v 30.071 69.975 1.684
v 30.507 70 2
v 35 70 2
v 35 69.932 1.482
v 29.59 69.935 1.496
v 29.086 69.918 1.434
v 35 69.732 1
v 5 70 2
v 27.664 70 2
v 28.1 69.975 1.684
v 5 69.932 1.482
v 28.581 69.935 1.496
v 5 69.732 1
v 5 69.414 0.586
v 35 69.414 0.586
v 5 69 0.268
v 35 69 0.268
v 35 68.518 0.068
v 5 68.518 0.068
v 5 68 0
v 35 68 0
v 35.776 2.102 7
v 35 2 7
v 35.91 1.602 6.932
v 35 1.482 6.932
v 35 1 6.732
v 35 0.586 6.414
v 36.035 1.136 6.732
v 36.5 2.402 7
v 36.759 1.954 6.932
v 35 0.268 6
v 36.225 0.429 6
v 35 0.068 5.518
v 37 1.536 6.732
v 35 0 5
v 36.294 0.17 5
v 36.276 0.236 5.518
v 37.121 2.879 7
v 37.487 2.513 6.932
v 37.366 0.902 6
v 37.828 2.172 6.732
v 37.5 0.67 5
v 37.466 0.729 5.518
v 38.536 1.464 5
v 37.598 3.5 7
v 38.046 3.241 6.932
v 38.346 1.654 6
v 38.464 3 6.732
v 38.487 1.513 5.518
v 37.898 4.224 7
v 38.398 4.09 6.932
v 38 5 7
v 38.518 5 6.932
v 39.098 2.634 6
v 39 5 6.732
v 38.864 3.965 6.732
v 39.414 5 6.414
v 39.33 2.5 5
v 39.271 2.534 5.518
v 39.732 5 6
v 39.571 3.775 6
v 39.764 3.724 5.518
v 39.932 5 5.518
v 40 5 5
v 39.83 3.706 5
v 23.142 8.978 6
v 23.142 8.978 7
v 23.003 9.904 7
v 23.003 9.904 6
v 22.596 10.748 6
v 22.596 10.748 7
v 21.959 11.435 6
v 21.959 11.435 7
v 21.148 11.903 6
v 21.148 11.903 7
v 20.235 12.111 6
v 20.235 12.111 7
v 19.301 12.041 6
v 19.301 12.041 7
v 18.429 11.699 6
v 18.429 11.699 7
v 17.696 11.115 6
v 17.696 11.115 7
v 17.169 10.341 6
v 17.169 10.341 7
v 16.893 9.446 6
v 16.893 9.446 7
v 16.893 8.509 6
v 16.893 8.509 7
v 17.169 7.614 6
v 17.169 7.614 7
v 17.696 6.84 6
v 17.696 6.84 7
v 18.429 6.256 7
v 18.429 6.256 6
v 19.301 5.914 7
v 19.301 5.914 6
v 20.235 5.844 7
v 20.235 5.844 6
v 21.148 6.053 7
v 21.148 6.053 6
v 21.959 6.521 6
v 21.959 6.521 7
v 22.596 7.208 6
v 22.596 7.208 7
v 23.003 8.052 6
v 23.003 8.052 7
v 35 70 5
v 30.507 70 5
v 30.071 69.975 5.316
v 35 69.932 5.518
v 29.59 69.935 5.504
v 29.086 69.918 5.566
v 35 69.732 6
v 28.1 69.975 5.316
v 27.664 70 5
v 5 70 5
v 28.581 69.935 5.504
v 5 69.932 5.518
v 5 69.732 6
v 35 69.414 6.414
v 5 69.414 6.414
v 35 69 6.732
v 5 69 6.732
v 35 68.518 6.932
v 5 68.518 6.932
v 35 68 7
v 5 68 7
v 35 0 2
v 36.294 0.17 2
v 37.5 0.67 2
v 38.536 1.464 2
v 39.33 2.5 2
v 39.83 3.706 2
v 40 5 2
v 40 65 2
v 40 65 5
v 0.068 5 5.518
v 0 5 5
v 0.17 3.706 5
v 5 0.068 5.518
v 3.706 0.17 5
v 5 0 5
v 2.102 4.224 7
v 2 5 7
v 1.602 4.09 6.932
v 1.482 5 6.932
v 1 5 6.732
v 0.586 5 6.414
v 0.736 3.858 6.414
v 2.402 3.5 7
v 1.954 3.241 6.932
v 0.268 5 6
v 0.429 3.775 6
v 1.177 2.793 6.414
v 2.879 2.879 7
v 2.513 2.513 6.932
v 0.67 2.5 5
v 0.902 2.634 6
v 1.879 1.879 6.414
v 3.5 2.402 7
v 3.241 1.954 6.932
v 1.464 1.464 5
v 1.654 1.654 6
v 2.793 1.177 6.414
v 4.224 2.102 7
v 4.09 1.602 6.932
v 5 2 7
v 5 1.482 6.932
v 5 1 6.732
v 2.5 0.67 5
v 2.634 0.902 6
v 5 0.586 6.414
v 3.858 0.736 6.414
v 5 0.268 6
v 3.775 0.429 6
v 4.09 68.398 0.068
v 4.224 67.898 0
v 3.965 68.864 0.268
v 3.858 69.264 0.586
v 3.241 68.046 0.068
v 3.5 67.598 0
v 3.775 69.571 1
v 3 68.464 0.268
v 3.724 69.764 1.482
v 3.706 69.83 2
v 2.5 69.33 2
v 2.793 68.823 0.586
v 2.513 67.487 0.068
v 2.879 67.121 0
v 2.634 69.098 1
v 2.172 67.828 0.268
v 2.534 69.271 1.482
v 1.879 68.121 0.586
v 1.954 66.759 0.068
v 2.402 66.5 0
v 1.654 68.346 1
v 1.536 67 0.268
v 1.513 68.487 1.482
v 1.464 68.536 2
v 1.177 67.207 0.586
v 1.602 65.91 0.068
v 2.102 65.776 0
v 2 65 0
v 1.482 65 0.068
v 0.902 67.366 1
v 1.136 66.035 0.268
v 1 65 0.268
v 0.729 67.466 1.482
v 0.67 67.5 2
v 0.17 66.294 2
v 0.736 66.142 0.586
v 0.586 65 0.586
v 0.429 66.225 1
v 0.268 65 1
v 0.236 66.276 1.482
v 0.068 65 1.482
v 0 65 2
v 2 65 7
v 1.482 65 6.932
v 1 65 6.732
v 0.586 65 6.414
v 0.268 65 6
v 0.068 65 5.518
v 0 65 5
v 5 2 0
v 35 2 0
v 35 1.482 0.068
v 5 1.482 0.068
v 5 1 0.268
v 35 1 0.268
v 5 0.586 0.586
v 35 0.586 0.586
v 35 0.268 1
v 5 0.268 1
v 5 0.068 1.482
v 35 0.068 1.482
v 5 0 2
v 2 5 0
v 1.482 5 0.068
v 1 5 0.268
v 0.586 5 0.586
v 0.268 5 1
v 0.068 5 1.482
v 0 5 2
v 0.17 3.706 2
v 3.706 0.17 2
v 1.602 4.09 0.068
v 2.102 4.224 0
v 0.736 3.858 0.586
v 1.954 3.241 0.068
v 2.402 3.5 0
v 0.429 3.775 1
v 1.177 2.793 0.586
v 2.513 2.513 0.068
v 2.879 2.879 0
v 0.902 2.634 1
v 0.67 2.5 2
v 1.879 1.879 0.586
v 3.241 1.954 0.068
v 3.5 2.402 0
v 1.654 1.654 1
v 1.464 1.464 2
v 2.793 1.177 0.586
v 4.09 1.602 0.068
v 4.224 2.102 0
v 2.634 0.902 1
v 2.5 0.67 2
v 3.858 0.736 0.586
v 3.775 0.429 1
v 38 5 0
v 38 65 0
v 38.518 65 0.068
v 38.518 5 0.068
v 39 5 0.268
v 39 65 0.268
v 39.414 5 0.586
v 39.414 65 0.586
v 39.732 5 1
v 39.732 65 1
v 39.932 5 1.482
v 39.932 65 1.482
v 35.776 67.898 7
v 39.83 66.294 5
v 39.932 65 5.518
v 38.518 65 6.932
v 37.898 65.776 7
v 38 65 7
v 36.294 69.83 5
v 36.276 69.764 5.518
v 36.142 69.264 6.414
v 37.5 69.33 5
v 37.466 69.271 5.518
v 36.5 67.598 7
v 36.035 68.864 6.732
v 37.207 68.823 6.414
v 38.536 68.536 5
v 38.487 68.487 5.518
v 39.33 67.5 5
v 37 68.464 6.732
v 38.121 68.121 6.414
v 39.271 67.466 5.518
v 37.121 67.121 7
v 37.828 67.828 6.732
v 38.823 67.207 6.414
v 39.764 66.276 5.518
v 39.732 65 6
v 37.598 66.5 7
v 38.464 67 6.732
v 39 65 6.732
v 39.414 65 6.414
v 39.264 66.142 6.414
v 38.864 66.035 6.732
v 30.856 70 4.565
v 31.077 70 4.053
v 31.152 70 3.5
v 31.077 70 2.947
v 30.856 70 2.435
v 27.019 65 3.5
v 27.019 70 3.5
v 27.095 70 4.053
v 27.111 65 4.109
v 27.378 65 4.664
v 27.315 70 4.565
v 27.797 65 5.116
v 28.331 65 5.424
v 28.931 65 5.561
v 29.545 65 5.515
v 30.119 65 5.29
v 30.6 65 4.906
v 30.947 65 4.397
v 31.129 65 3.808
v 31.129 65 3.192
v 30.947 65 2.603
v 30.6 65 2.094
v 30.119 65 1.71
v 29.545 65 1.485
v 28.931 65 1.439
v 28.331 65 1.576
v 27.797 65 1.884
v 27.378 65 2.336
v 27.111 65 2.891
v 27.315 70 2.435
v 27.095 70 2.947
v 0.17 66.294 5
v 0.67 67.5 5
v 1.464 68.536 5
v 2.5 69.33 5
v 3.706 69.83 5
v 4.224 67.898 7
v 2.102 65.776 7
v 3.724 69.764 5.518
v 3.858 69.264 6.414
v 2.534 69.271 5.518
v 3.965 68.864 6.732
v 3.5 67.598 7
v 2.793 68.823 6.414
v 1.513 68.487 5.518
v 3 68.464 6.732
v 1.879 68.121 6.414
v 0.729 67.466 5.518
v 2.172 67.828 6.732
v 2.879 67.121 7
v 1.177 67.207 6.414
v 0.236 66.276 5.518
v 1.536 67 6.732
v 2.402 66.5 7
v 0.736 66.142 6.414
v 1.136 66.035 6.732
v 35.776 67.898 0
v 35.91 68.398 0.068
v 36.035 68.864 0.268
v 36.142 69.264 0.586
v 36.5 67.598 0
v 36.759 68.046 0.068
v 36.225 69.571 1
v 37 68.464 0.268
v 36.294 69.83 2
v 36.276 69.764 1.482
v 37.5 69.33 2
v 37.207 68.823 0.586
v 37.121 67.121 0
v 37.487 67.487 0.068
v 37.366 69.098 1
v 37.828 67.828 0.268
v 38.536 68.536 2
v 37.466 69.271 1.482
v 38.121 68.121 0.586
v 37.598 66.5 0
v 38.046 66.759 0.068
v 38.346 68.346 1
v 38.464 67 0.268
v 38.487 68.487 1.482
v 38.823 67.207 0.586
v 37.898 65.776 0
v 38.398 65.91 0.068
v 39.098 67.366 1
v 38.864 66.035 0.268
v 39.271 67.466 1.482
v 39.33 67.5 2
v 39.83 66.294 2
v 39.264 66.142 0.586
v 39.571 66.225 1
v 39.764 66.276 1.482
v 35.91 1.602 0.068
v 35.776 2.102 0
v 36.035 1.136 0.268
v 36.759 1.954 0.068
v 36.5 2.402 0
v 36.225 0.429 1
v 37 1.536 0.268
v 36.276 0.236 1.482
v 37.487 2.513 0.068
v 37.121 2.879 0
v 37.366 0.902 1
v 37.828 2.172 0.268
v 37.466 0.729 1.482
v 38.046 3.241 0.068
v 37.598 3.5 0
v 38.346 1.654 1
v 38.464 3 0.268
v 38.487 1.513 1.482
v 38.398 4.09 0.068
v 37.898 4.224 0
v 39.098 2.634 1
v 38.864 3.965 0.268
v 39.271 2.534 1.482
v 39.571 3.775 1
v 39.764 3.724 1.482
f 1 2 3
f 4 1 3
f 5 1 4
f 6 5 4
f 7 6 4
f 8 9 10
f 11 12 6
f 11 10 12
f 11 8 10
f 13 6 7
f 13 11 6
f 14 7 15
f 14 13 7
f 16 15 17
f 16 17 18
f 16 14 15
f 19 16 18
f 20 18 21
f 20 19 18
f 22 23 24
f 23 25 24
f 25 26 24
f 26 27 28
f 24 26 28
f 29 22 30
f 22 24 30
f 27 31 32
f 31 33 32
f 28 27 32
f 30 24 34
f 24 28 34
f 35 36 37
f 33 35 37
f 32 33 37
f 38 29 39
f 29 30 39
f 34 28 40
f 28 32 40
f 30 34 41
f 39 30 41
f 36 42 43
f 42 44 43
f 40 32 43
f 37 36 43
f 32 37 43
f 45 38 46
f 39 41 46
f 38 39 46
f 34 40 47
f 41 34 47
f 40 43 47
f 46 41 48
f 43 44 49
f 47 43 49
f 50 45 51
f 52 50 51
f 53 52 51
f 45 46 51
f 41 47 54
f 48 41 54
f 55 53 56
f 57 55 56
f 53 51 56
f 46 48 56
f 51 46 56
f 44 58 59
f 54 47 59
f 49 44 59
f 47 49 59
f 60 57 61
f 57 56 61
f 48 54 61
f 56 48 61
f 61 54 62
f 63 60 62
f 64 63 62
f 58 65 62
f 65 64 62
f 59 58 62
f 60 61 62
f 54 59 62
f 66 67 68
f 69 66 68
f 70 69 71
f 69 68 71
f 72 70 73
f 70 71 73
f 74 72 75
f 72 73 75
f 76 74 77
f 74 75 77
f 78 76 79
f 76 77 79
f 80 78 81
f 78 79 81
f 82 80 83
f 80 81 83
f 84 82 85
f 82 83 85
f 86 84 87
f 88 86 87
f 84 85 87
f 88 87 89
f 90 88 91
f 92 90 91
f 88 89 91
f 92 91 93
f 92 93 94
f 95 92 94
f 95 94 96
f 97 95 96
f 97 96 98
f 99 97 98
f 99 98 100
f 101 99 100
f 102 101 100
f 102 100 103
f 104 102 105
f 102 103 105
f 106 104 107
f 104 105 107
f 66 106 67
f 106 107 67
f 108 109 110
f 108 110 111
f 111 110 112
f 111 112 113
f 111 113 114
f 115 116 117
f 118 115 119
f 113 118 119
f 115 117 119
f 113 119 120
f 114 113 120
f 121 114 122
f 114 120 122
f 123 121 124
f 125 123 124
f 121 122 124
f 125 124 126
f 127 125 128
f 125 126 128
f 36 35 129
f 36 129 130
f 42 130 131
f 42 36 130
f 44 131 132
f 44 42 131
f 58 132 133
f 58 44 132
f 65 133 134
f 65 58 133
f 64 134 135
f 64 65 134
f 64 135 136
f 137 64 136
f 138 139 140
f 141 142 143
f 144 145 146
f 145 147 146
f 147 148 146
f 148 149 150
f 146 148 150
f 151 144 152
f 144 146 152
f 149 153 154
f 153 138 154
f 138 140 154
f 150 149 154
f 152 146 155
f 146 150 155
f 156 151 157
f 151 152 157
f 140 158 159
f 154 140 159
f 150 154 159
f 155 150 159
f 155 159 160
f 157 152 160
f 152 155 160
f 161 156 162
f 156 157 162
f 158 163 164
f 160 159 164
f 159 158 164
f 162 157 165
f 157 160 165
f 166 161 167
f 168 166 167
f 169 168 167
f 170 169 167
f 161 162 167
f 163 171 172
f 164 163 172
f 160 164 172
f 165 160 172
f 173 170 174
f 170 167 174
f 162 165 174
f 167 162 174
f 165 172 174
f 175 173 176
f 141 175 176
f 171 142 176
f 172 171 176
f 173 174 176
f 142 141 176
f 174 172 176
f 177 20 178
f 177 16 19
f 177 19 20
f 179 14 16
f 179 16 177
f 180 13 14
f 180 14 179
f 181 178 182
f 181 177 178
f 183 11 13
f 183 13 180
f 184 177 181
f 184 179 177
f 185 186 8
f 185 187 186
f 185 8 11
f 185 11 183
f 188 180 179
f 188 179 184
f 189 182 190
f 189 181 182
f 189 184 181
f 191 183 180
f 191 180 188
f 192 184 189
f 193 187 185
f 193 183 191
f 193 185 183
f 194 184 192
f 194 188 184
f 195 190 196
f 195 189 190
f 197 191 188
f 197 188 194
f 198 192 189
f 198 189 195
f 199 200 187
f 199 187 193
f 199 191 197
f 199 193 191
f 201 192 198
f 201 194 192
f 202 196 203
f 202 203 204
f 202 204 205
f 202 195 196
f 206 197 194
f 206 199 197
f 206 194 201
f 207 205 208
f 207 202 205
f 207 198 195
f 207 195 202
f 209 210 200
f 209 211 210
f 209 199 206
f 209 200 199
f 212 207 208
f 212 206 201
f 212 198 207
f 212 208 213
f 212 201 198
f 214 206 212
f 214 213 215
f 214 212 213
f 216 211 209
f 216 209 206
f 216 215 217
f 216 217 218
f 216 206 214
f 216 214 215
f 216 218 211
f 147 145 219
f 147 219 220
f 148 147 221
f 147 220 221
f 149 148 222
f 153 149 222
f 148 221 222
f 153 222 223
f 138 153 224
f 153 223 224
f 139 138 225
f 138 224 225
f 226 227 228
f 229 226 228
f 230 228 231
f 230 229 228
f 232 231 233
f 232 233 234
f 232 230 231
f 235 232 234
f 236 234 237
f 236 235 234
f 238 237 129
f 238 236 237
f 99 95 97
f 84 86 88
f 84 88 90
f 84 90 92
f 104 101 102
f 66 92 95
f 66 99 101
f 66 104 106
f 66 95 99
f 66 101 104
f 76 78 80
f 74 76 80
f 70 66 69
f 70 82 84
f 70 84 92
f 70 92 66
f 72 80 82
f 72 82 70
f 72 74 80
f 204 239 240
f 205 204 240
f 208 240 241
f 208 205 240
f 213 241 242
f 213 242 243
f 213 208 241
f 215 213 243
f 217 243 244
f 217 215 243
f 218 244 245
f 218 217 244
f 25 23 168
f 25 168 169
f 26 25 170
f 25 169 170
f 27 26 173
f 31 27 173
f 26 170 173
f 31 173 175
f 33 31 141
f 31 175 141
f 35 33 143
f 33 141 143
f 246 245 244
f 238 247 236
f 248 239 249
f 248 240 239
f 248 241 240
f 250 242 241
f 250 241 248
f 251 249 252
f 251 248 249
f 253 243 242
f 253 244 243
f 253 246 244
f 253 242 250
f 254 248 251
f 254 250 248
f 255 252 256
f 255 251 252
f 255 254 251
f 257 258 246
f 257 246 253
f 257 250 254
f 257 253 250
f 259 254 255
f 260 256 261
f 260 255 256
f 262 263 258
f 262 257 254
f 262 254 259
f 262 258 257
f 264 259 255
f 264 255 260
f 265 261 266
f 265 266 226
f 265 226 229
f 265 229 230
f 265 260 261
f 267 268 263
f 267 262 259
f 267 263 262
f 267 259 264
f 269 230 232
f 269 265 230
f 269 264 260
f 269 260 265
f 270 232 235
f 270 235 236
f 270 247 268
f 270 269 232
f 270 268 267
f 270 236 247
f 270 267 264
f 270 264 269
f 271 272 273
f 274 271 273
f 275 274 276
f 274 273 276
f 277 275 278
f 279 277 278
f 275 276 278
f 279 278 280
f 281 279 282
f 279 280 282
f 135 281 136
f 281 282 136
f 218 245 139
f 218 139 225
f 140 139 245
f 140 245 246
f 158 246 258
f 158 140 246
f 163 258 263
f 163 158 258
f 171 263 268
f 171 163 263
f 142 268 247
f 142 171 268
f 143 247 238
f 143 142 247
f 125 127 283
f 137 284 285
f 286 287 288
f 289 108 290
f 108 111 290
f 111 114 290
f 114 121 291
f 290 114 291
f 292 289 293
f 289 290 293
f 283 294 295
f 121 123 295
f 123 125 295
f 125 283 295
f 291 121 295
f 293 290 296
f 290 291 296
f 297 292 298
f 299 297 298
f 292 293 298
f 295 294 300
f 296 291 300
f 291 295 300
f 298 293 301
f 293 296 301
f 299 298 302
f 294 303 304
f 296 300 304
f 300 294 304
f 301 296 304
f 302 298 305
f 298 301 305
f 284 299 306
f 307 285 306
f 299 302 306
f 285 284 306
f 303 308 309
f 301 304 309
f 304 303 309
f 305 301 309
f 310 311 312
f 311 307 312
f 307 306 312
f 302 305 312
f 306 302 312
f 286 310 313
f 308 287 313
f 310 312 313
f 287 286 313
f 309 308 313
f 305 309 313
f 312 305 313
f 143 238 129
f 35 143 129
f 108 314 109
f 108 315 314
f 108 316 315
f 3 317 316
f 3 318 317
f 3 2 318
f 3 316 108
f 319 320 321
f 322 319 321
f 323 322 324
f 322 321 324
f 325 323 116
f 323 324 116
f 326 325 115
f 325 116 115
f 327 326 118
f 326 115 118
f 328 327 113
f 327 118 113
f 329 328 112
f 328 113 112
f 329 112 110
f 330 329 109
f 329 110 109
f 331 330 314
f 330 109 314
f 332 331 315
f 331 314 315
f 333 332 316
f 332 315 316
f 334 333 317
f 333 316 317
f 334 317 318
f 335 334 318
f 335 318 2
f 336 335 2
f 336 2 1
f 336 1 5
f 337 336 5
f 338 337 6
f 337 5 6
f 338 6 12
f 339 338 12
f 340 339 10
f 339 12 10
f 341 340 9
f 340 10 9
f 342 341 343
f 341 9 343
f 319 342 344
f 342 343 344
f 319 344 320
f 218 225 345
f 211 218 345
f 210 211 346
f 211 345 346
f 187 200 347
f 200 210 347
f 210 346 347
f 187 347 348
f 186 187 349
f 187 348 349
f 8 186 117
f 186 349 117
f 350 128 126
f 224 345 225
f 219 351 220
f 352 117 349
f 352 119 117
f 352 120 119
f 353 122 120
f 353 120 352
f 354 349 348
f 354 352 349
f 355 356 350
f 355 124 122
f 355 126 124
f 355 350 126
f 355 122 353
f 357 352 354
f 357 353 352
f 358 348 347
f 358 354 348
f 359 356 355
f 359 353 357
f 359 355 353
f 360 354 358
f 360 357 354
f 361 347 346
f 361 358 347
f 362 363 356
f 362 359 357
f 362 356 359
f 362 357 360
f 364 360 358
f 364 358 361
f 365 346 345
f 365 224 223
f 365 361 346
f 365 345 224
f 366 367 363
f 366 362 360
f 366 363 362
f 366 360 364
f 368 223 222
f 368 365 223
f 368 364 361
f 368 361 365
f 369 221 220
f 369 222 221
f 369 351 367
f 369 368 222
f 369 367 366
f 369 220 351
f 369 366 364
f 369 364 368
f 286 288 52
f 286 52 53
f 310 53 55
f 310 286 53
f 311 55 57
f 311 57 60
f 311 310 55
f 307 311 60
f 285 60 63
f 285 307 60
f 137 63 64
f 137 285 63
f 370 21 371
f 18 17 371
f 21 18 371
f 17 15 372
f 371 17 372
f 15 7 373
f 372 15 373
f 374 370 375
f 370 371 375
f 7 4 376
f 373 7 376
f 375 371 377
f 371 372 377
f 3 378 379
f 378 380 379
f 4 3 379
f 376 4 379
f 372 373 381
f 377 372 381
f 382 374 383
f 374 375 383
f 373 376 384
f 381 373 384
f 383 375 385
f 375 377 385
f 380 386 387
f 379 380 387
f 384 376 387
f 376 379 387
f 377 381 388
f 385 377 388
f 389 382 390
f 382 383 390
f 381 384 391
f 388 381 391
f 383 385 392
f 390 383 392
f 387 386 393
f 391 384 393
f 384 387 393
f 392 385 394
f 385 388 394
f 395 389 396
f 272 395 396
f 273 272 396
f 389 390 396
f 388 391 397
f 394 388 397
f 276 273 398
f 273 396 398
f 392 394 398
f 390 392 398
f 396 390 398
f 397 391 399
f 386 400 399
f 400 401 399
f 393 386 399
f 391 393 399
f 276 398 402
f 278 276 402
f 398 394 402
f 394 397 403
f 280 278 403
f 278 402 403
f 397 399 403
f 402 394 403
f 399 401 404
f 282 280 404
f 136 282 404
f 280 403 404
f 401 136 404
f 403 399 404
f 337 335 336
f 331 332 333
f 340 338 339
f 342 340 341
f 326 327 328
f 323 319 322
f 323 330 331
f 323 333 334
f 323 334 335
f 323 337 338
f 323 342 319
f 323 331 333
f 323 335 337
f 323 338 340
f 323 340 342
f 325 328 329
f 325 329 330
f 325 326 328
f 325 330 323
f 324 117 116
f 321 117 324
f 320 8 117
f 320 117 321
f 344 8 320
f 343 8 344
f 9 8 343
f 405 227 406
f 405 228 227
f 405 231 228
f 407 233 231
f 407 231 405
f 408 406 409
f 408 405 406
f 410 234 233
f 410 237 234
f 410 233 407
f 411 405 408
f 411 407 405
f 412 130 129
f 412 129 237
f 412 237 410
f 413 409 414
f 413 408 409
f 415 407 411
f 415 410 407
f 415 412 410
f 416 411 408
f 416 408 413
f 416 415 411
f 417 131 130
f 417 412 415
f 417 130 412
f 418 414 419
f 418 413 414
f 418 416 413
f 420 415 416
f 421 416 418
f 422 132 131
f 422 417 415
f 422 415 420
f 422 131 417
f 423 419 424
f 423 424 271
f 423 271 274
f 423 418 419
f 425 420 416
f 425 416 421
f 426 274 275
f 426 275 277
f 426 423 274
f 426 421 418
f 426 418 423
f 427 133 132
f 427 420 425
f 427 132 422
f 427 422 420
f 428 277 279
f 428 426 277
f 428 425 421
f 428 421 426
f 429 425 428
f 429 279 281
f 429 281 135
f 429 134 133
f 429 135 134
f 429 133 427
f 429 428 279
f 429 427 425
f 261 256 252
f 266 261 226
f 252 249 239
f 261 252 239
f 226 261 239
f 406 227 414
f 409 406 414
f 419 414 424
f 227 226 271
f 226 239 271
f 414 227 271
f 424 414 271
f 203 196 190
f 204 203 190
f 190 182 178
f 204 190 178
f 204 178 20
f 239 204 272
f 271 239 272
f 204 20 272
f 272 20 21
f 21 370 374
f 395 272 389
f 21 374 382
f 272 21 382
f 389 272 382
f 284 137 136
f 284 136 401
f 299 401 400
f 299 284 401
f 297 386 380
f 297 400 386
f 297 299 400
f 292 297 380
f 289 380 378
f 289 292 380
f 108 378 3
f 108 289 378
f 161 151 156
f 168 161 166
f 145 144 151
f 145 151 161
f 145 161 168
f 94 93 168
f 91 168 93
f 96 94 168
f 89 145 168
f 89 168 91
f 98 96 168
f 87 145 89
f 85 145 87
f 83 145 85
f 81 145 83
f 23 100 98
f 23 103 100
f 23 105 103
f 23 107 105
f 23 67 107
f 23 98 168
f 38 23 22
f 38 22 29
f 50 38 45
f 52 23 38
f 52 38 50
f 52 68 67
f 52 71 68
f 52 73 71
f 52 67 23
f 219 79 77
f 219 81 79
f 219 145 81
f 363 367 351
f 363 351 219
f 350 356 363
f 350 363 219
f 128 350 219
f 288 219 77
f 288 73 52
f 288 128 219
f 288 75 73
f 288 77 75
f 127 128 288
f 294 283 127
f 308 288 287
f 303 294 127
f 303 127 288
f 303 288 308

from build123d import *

# Parameters (mm, degrees)
F0_W         = 40
F0_H         = 70
F1_DEPTH     = 7
F2_R         = 5
F3_R         = 2.0663885281
F4_DEPTH     = 5
F5_T1_DEPTH  = 60
F5_T3_DEPTH  = 30
F5_T6_ANGLE  = 90
F5_T8_ANGLE  = 90
F5_T10_ANGLE = 90
F5_T12_ANGLE = 90
F5_T14_ANGLE = 90
F5_T16_ANGLE = 90
F5_T18_ANGLE = 90
F5_T20_ANGLE = 90
F6_R         = 3.1424887648
F7_DEPTH     = 1


# Not quite as in the source:
# - a fillet or chamfer that OpenCascade refuses, or shapes differently, is made with other operations: its cross-section is extruded or revolved along the edge and cut away or added


with BuildPart() as f1:
    # F0 (on Top) → F1 (new body)
    with BuildSketch(Plane.XY):
        with Locations((20, 35)):
            Rectangle(F0_W, F0_H)
    extrude(amount=F1_DEPTH)

    # F2
    f2_edges = [f1.edges().sort_by_distance(p)[0] for p in [
        (40, 0, 3.5),
        (40, 70, 3.5),
        (0, 0, 3.5),
        (0, 70, 3.5),
    ]]
    fillet(f2_edges, radius=F2_R)

    # F3 (on face) → F4 (cut)
    with BuildSketch(Plane(origin=(0, 70, 0), x_dir=(-1, 0, 0), z_dir=(0, 1, 0))):
        with Locations((-29.0856193751, 3.5)):
            Circle(F3_R)
    extrude(amount=-F4_DEPTH, mode=Mode.SUBTRACT)

    # F5: fillet of radius 2 on 16 edges, made by hand

    # F5_s2 → F5_t1 (cut)
    with BuildSketch(Plane.XZ.offset(-65)):
        with BuildLine():
            ThreePointArc((2, 7), (0.5857864376, 6.4142135624), (0, 5))
            Line((0, 5), (0, 7))
            Line((0, 7), (2, 7))
        make_face()
        with BuildLine():
            ThreePointArc((2, 0), (0.5857864376, 0.5857864376), (0, 2))
            Line((0, 2), (0, 0))
            Line((0, 0), (2, 0))
        make_face()
        with BuildLine():
            ThreePointArc((38, 0), (39.4142135624, 0.5857864376), (40, 2))
            Line((40, 2), (40, 0))
            Line((40, 0), (38, 0))
        make_face()
        with BuildLine():
            ThreePointArc((38, 7), (39.4142135624, 6.4142135624), (40, 5))
            Line((40, 5), (40, 7))
            Line((40, 7), (38, 7))
        make_face()
    extrude(amount=F5_T1_DEPTH, mode=Mode.SUBTRACT)

    # F5_s4 → F5_t3 (cut)
    with BuildSketch(Plane.YZ.offset(5)):
        with BuildLine():
            ThreePointArc((70, 2), (69.4142135624, 0.5857864376), (68, 0))
            Line((68, 0), (70, 0))
            Line((70, 0), (70, 2))
        make_face()
        with BuildLine():
            ThreePointArc((70, 5), (69.4142135624, 6.4142135624), (68, 7))
            Line((68, 7), (70, 7))
            Line((70, 7), (70, 5))
        make_face()
        with BuildLine():
            ThreePointArc((2, 0), (0.5857864376, 0.5857864376), (0, 2))
            Line((0, 2), (0, 0))
            Line((0, 0), (2, 0))
        make_face()
        with BuildLine():
            ThreePointArc((2, 7), (0.5857864376, 6.4142135624), (0, 5))
            Line((0, 5), (0, 7))
            Line((0, 7), (2, 7))
        make_face()
    extrude(amount=F5_T3_DEPTH, mode=Mode.SUBTRACT)

    # F5_s5 → F5_t6 (revolve, cut)
    with BuildSketch(Plane.YZ.offset(35)):
        with BuildLine():
            ThreePointArc((68, 0), (69.4142135624, 0.5857864376), (70, 2))
            Line((70, 2), (70, 0))
            Line((70, 0), (68, 0))
        make_face()
    revolve(axis=Axis((35, 65, 0), (0, 0, -1)), revolution_arc=F5_T6_ANGLE, mode=Mode.SUBTRACT)

    # F5_s7 → F5_t8 (revolve, cut)
    with BuildSketch(Plane.YZ.offset(5)):
        with BuildLine():
            ThreePointArc((68, 0), (69.4142135624, 0.5857864376), (70, 2))
            Line((70, 2), (70, 0))
            Line((70, 0), (68, 0))
        make_face()
    revolve(axis=Axis((5, 65, 0), (0, 0, 1)), revolution_arc=F5_T8_ANGLE, mode=Mode.SUBTRACT)

    # F5_s9 → F5_t10 (revolve, cut)
    with BuildSketch(Plane.YZ.offset(35)):
        with BuildLine():
            ThreePointArc((2, 0), (0.5857864376, 0.5857864376), (0, 2))
            Line((0, 2), (0, 0))
            Line((0, 0), (2, 0))
        make_face()
    revolve(axis=Axis((35, 5, 0), (0, 0, 1)), revolution_arc=F5_T10_ANGLE, mode=Mode.SUBTRACT)

    # F5_s11 → F5_t12 (revolve, cut)
    with BuildSketch(Plane.XZ.offset(-5)):
        with BuildLine():
            ThreePointArc((2, 0), (0.5857864376, 0.5857864376), (0, 2))
            Line((0, 2), (0, 0))
            Line((0, 0), (2, 0))
        make_face()
    revolve(axis=Axis((5, 5, 0), (0, 0, 1)), revolution_arc=F5_T12_ANGLE, mode=Mode.SUBTRACT)

    # F5_s13 → F5_t14 (revolve, cut)
    with BuildSketch(Plane.YZ.offset(35)):
        with BuildLine():
            ThreePointArc((70, 5), (69.4142135624, 6.4142135624), (68, 7))
            Line((68, 7), (70, 7))
            Line((70, 7), (70, 5))
        make_face()
    revolve(axis=Axis((35, 65, 7), (0, 0, -1)), revolution_arc=F5_T14_ANGLE, mode=Mode.SUBTRACT)

    # F5_s15 → F5_t16 (revolve, cut)
    with BuildSketch(Plane.YZ.offset(5)):
        with BuildLine():
            ThreePointArc((70, 5), (69.4142135624, 6.4142135624), (68, 7))
            Line((68, 7), (70, 7))
            Line((70, 7), (70, 5))
        make_face()
    revolve(axis=Axis((5, 65, 7), (0, 0, 1)), revolution_arc=F5_T16_ANGLE, mode=Mode.SUBTRACT)

    # F5_s17 → F5_t18 (revolve, cut)
    with BuildSketch(Plane.YZ.offset(35)):
        with BuildLine():
            ThreePointArc((2, 7), (0.5857864376, 6.4142135624), (0, 5))
            Line((0, 5), (0, 7))
            Line((0, 7), (2, 7))
        make_face()
    revolve(axis=Axis((35, 5, 7), (0, 0, 1)), revolution_arc=F5_T18_ANGLE, mode=Mode.SUBTRACT)

    # F5_s19 → F5_t20 (revolve, cut)
    with BuildSketch(Plane.XZ.offset(-5)):
        with BuildLine():
            ThreePointArc((2, 7), (0.5857864376, 6.4142135624), (0, 5))
            Line((0, 5), (0, 7))
            Line((0, 7), (2, 7))
        make_face()
    revolve(axis=Axis((5, 5, 7), (0, 0, 1)), revolution_arc=F5_T20_ANGLE, mode=Mode.SUBTRACT)

    # F6 (on face) → F7 (cut)
    with BuildSketch(Plane.XY.offset(7)):
        with Locations((20, 8.9777829126)):
            Circle(F6_R)
    extrude(amount=-F7_DEPTH, mode=Mode.SUBTRACT)


solid = f1.part
